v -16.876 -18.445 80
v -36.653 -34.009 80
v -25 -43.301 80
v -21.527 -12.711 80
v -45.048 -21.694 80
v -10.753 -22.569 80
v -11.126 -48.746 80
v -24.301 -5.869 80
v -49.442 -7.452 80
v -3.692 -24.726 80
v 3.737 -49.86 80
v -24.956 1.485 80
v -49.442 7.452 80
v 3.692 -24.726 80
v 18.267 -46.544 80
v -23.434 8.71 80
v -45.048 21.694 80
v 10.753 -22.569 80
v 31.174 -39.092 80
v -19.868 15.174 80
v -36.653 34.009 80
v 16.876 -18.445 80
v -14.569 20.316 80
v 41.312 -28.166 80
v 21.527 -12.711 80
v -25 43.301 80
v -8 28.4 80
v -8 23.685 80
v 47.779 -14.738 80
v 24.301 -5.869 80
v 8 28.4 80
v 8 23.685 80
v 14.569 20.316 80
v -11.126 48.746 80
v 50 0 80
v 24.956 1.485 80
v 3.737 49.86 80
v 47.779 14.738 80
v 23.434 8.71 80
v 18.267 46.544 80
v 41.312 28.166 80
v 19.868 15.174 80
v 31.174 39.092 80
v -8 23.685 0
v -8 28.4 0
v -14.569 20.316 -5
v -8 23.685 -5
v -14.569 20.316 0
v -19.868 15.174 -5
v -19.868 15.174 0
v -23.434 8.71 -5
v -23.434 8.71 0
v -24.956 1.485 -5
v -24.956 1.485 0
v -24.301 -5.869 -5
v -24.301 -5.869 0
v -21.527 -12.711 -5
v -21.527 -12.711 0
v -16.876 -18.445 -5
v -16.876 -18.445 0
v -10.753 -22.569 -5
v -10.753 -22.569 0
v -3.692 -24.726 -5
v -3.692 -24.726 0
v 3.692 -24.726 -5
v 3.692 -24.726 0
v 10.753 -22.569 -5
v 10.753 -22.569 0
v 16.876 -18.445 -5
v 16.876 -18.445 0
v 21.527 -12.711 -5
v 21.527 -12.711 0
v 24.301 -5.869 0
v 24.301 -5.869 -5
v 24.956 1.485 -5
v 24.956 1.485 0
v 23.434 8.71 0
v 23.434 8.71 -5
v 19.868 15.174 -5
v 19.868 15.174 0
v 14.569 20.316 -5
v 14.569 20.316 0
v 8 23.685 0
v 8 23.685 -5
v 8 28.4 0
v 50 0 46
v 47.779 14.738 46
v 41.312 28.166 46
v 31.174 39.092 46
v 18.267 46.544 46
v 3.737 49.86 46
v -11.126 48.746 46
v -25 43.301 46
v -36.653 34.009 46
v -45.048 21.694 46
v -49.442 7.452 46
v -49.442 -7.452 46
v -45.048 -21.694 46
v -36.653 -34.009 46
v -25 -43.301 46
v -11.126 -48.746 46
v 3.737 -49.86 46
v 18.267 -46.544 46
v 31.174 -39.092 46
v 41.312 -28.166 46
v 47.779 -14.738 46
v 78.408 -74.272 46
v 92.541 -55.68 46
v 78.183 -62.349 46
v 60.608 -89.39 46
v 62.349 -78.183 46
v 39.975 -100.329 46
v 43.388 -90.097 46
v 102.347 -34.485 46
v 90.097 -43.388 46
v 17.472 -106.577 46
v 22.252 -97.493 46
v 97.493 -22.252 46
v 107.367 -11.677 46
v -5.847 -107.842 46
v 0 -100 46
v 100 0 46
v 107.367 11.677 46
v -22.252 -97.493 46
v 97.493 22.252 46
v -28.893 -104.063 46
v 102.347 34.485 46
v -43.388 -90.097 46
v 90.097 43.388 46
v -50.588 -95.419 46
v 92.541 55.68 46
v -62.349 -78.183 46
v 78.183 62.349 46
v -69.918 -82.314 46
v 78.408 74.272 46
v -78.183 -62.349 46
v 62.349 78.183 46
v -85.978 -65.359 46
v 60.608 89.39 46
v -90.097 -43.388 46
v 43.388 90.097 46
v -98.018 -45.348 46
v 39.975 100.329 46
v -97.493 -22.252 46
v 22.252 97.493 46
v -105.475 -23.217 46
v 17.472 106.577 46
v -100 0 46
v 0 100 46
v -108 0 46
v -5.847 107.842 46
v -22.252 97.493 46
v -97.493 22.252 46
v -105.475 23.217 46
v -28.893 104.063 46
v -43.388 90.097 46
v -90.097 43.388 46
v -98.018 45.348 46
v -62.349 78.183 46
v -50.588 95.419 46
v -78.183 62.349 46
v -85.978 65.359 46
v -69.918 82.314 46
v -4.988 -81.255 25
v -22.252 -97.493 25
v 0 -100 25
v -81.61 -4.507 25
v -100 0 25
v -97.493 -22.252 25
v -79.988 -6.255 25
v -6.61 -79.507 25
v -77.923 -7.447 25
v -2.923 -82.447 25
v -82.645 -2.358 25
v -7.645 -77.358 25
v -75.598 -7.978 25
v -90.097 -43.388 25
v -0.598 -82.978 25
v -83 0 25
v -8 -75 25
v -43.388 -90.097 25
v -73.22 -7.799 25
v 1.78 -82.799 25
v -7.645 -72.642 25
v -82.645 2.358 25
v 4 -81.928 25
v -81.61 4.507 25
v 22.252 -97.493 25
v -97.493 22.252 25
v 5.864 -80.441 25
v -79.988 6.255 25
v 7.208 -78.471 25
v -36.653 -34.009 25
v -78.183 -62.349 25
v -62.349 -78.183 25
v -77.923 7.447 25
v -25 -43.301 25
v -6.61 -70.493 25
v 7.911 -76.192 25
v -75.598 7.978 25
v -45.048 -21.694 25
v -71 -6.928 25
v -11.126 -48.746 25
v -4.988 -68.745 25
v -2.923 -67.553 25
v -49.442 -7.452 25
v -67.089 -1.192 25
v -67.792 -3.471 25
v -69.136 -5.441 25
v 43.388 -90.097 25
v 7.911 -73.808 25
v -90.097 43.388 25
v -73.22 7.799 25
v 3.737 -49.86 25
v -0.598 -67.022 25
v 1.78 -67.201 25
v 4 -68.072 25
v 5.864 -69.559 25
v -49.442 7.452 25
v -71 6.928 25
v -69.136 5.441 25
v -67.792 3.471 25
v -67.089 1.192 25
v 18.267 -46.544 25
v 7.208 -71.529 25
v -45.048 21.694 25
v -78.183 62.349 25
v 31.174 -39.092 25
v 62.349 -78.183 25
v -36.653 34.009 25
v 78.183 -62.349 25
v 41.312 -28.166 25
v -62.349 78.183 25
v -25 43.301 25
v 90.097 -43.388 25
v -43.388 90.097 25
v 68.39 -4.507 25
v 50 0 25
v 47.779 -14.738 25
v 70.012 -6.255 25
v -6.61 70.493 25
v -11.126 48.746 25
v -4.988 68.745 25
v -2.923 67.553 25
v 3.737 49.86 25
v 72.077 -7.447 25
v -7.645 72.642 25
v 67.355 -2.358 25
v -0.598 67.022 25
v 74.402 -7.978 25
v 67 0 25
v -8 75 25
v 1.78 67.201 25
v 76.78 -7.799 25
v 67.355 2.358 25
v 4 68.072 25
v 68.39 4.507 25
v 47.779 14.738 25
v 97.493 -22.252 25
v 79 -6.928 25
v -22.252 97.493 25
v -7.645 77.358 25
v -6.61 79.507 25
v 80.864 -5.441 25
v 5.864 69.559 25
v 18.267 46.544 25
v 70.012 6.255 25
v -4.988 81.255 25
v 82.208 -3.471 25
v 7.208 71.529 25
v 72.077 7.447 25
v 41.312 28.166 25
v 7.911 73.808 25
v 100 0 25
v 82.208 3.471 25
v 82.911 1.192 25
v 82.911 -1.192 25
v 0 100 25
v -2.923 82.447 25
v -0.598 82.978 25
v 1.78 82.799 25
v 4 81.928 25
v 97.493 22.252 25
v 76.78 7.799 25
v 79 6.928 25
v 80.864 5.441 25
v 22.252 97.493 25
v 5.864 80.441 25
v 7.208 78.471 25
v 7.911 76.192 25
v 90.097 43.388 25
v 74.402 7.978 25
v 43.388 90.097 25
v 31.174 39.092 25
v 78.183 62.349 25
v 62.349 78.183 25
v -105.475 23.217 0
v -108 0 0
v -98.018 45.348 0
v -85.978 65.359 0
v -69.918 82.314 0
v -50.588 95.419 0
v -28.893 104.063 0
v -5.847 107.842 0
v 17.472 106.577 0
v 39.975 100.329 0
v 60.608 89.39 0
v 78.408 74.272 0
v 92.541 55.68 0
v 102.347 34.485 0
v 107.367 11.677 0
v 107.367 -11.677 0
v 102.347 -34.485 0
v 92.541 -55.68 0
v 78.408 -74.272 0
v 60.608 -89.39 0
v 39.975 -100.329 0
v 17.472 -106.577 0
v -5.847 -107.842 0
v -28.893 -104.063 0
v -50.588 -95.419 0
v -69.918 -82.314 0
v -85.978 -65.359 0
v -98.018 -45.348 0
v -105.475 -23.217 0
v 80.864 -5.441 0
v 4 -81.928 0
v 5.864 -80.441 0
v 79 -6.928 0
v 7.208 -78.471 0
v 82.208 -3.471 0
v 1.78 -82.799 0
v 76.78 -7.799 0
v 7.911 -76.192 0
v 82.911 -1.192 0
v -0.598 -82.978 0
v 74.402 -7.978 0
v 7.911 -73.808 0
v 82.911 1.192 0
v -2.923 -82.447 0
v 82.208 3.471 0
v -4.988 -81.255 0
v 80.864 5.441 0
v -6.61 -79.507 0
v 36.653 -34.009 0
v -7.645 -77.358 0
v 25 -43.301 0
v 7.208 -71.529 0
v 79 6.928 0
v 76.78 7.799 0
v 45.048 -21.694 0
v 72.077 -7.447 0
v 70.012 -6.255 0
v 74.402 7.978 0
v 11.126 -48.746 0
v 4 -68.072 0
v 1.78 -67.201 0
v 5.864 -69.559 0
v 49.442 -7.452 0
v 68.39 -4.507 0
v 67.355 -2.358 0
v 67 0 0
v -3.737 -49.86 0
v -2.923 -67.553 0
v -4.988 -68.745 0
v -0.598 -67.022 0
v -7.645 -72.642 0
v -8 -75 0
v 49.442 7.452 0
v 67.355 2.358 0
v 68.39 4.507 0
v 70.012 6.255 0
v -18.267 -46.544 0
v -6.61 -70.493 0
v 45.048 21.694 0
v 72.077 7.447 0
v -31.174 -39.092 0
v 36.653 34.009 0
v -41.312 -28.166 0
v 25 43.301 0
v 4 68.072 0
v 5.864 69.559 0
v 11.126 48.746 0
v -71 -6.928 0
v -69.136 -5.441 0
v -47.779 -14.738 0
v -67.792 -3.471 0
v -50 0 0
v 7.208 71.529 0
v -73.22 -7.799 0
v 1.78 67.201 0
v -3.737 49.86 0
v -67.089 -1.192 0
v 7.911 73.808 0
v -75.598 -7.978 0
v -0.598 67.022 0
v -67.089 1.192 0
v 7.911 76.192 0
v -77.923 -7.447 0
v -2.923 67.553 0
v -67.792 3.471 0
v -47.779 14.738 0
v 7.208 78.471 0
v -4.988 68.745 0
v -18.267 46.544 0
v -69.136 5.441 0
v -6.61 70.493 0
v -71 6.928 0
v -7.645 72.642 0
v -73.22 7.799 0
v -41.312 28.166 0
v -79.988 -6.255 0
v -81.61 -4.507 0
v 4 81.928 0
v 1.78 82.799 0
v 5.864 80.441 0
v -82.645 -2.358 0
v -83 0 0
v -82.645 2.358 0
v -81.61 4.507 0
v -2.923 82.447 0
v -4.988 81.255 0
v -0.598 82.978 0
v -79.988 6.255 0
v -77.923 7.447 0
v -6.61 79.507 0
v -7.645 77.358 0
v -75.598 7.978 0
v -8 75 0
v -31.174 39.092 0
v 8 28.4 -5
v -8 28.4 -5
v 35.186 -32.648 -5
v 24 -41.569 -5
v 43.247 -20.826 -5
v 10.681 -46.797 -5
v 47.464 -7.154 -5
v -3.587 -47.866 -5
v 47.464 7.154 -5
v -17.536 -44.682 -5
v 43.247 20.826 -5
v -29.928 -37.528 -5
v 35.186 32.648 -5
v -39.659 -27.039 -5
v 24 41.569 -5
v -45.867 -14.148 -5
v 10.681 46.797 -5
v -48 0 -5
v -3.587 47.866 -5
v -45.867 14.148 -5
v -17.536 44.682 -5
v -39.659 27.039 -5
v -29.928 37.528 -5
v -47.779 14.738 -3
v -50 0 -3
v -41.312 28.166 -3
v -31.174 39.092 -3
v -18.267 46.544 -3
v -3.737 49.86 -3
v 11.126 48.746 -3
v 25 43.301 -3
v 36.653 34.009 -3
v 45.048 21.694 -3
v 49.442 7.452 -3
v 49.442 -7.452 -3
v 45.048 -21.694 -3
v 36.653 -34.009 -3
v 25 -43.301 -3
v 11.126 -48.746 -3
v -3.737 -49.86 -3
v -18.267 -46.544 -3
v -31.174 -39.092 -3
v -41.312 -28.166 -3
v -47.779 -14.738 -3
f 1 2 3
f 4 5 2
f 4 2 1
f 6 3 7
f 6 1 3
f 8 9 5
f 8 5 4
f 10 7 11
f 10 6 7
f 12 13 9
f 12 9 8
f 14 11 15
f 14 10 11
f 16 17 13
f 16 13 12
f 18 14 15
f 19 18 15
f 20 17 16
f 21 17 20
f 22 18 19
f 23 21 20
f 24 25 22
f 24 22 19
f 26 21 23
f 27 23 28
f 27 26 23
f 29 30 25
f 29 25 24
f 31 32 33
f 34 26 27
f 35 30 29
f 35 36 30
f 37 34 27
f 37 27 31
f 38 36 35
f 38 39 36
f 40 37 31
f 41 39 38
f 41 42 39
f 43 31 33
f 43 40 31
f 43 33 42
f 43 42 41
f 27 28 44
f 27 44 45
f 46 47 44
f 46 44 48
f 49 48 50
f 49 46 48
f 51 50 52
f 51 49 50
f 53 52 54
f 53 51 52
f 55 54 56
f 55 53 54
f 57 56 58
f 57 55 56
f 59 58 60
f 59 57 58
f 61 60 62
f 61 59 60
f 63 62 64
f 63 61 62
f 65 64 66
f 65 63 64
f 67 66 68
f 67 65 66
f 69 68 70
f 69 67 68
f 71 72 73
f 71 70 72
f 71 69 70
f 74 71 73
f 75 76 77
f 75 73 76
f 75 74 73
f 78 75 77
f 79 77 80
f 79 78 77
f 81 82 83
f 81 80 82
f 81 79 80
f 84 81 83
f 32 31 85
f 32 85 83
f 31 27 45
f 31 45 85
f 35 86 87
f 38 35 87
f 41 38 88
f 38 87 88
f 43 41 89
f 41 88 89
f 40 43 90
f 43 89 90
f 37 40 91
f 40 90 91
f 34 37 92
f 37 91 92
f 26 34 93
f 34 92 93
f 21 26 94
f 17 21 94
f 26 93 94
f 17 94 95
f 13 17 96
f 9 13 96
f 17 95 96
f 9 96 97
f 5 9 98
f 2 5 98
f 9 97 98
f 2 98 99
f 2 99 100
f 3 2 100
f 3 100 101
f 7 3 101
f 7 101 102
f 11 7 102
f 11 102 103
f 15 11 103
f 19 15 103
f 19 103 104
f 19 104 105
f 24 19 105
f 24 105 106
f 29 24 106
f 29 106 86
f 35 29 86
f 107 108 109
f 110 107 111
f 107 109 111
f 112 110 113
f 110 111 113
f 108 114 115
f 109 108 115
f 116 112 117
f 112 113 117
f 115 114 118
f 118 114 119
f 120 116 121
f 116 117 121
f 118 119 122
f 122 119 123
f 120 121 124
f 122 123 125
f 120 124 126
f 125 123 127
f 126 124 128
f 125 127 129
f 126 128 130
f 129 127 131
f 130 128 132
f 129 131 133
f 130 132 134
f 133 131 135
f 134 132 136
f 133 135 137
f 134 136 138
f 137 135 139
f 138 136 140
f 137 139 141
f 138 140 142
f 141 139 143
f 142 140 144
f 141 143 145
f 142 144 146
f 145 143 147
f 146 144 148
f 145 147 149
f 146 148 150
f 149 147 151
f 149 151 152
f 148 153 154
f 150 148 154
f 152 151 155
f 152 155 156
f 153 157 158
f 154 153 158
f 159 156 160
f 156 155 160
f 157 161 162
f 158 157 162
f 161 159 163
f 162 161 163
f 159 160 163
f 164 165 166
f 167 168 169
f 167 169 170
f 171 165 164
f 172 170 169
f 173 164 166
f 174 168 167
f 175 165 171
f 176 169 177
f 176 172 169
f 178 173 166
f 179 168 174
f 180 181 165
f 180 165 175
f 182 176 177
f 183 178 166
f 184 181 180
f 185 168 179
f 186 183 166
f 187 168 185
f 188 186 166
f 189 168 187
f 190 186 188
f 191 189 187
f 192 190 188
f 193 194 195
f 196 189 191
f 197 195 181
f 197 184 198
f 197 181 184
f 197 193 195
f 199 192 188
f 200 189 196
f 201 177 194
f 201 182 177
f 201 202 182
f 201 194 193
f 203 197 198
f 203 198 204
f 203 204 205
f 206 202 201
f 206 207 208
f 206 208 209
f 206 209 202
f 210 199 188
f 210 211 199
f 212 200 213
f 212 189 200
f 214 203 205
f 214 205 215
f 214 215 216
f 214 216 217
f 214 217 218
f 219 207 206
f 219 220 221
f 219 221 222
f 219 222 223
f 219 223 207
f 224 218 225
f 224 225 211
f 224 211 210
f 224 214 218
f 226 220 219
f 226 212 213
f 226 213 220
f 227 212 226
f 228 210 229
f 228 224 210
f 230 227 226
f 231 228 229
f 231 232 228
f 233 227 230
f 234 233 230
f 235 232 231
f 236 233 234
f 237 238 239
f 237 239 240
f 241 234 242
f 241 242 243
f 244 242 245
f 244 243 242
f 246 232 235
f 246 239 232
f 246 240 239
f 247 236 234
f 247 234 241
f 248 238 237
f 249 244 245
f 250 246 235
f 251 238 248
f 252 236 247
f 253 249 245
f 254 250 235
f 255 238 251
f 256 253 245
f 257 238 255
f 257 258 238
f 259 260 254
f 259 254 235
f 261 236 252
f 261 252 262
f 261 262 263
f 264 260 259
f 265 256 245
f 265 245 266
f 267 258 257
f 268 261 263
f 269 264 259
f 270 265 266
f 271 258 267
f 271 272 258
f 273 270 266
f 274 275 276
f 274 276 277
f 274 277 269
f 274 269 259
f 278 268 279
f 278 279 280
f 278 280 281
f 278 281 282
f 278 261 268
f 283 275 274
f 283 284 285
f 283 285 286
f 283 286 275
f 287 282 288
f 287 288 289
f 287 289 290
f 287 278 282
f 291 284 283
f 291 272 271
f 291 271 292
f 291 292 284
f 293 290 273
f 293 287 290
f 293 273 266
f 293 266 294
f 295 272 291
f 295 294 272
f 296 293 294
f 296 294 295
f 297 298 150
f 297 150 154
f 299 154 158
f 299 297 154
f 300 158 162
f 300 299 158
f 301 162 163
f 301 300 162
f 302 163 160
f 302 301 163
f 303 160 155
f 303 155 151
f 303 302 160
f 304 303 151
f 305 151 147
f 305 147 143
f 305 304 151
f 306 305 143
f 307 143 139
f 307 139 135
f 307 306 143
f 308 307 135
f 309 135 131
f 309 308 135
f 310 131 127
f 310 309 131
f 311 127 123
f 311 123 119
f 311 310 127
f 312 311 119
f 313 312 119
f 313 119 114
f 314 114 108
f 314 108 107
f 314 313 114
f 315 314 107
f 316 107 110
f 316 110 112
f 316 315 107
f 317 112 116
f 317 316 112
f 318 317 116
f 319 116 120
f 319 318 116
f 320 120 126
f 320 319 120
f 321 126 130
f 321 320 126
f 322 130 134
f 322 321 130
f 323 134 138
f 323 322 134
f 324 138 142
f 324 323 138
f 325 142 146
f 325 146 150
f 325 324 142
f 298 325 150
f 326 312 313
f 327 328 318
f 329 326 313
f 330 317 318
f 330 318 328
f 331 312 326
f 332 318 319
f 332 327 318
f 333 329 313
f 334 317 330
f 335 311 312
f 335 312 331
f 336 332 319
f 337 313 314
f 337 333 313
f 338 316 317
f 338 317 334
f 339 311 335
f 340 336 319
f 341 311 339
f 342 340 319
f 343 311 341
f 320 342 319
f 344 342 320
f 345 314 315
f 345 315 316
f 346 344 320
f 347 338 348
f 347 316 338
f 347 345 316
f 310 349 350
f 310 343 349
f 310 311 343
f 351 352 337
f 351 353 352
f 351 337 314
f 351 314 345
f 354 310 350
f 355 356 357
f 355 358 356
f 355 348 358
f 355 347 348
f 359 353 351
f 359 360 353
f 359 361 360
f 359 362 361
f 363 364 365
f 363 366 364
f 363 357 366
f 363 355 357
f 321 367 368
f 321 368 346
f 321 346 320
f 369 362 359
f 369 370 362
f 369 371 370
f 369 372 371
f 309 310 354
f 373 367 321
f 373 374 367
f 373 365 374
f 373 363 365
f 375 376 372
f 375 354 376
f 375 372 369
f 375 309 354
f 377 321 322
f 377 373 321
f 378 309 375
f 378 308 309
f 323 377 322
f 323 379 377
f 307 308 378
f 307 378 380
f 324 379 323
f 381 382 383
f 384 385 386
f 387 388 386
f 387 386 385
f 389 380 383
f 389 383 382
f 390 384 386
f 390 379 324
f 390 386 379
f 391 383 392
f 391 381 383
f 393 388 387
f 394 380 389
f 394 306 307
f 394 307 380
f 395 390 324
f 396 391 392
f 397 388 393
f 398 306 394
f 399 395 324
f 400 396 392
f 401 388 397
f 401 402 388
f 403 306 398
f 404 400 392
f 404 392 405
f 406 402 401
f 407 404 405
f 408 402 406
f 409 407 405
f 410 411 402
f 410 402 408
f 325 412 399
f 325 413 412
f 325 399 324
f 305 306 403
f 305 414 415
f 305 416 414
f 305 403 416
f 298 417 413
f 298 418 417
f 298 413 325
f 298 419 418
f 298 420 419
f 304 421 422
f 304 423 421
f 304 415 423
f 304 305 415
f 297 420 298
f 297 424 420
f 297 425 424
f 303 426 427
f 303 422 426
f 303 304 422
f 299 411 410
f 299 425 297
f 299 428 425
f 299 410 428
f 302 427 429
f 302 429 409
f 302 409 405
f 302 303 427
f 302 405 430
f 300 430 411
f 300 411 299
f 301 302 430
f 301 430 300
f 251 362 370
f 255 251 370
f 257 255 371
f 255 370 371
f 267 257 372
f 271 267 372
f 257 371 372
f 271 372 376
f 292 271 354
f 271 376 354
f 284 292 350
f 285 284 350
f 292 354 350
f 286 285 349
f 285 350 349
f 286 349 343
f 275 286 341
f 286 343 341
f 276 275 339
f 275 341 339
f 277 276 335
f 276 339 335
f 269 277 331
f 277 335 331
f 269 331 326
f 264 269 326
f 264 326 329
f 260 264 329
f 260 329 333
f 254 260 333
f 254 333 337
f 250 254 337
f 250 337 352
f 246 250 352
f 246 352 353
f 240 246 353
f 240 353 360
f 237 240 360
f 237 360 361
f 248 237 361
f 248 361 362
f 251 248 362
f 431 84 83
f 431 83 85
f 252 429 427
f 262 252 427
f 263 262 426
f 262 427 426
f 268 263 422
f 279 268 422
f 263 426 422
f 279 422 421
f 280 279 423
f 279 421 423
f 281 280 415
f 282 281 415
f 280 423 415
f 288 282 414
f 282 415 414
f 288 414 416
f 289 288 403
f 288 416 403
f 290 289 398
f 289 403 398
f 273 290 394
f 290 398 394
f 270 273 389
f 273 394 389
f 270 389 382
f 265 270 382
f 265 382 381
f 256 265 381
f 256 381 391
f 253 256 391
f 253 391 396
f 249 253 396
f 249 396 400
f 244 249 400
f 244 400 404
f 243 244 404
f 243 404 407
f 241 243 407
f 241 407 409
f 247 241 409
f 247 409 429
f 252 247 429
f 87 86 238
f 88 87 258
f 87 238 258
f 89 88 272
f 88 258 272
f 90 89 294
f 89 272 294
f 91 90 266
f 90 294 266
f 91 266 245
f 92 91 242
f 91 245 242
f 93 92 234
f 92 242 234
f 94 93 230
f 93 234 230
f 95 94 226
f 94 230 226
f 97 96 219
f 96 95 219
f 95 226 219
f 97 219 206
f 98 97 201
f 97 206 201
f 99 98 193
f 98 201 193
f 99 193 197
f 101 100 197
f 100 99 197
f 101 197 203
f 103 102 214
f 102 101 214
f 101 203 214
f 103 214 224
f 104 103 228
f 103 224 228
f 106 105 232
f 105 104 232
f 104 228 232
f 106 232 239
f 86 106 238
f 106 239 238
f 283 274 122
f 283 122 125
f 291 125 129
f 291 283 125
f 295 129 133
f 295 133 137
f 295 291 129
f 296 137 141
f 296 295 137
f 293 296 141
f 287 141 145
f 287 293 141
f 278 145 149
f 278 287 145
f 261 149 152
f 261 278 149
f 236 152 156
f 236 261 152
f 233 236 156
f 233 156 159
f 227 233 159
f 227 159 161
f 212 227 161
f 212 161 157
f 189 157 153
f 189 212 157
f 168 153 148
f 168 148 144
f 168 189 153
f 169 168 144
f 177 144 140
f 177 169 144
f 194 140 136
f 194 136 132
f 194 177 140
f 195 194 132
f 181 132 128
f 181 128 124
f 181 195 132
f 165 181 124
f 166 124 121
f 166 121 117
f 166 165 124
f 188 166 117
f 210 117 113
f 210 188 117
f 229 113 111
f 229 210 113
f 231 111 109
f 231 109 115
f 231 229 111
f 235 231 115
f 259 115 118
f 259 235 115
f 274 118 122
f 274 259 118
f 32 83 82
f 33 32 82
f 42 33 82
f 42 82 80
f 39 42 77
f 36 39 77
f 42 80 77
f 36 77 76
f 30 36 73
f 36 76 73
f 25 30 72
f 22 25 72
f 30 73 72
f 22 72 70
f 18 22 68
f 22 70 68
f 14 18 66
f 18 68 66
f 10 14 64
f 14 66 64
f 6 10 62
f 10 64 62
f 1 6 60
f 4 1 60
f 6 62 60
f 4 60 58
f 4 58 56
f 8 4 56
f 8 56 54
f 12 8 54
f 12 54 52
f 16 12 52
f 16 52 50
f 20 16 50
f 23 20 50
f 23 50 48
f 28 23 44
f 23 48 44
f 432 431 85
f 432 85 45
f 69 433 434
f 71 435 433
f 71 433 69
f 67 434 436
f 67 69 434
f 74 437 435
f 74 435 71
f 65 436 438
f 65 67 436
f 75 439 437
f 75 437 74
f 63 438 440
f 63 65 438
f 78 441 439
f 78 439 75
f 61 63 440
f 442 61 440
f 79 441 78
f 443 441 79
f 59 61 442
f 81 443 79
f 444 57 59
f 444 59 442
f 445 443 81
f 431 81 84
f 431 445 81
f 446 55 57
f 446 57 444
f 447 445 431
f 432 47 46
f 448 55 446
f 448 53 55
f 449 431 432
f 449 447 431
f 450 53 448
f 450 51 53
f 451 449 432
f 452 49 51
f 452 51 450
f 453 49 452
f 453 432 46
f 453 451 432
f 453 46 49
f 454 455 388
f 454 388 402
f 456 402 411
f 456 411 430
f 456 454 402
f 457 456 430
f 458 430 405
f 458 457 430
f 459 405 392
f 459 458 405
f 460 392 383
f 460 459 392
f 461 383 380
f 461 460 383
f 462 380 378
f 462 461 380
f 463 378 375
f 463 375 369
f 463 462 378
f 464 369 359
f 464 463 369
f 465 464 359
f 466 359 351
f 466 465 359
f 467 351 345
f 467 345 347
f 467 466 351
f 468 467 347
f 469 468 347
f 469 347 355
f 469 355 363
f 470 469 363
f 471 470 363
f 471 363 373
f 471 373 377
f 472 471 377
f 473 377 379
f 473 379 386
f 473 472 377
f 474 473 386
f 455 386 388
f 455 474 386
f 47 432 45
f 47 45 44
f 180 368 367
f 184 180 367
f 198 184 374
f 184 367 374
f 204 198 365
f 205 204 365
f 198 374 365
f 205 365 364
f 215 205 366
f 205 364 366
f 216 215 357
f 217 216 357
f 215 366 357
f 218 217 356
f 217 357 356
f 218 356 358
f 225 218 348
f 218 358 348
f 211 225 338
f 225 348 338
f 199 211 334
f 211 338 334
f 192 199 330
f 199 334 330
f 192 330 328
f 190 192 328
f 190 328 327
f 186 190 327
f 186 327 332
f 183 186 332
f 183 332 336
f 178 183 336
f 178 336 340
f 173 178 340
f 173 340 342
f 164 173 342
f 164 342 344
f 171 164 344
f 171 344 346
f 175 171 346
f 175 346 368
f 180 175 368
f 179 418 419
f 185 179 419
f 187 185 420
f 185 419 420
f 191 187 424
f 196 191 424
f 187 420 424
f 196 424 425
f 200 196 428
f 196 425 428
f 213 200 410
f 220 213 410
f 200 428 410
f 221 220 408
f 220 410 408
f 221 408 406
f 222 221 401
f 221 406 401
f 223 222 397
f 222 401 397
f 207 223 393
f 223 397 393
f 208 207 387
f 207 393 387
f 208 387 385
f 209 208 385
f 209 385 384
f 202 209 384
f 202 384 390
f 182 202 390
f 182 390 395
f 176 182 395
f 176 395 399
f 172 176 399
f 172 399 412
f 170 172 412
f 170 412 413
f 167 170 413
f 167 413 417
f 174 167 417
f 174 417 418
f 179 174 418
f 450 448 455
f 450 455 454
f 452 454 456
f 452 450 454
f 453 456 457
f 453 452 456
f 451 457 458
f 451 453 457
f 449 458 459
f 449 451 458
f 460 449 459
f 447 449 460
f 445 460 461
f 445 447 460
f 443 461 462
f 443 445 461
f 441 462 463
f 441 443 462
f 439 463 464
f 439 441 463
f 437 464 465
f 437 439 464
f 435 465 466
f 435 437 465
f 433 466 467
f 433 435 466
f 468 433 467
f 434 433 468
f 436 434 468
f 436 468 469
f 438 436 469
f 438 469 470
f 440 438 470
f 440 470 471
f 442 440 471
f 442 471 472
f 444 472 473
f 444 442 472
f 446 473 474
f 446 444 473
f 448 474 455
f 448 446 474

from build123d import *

# Parameters (mm, degrees)
SKETCH1_R           = 50
BOSS_EXTRUDE1_DEPTH = 80
SKETCH2_R           = 108
SKETCH2_R_2         = 50
SKETCH2_R_3         = 8
BOSS_EXTRUDE3_DEPTH = 46
BOSS_EXTRUDE4_START = 5
SKETCH3_R           = 50
BOSS_EXTRUDE4_DEPTH = 5
CHAMFER1_SIZE       = 2
CUT_EXTRUDE1_START  = -21
SKETCH6_R           = 100
SKETCH6_R_2         = 50
CUT_EXTRUDE1_DEPTH  = 21


with BuildPart() as part:
    # Sketch1 → Boss-Extrude1 (new body)
    with BuildSketch(Plane.XY):
        Circle(SKETCH1_R)
        with BuildLine():
            Line((-8, 28.4), (8, 28.4))
            Line((8, 28.4), (8, 23.685438565))
            ThreePointArc((8, 23.685438565), (0, -25), (-8, 23.685438565))
            Line((-8, 23.685438565), (-8, 28.4))
        make_face(mode=Mode.SUBTRACT)
    extrude(amount=BOSS_EXTRUDE1_DEPTH)

    # Sketch2 → Boss-Extrude3 (add)
    with BuildSketch(Plane(origin=(0, 0, 0), x_dir=(-1, 0, 0), z_dir=(0, 0, -1))):
        Circle(SKETCH2_R)
        Circle(SKETCH2_R_2, mode=Mode.SUBTRACT)
        with Locations((0, 75)):
            Circle(SKETCH2_R_3, mode=Mode.SUBTRACT)
        with Locations((75, 0)):
            Circle(SKETCH2_R_3, mode=Mode.SUBTRACT)
        with Locations((0, -75)):
            Circle(SKETCH2_R_3, mode=Mode.SUBTRACT)
        with Locations((-75, 0)):
            Circle(SKETCH2_R_3, mode=Mode.SUBTRACT)
    extrude(amount=-BOSS_EXTRUDE3_DEPTH)

    # Sketch3 → Boss-Extrude4 (add)
    with BuildSketch(Plane(origin=(0, 0, 0), x_dir=(-1, 0, 0), z_dir=(0, 0, -1)).offset(BOSS_EXTRUDE4_START)):
        Circle(SKETCH3_R)
        with BuildLine():
            Line((-8, 23.685438565), (-8, 28.4))
            Line((-8, 28.4), (8, 28.4))
            Line((8, 28.4), (8, 23.685438565))
            ThreePointArc((8, 23.685438565), (0, -25), (-8, 23.685438565))
        make_face(mode=Mode.SUBTRACT)
    extrude(amount=-BOSS_EXTRUDE4_DEPTH)

    # Chamfer1
    chamfer1_edges = [part.edges().sort_by_distance(p)[0] for p in [
        (50, 0, -5),
    ]]
    chamfer(chamfer1_edges, length=CHAMFER1_SIZE)

    # Sketch6 → Cut-Extrude1 (cut)
    with BuildSketch(Plane.XY.offset(46).offset(CUT_EXTRUDE1_START)):
        Circle(SKETCH6_R)
        Circle(SKETCH6_R_2, mode=Mode.SUBTRACT)
    extrude(amount=CUT_EXTRUDE1_DEPTH, mode=Mode.SUBTRACT)


solid = part.part
